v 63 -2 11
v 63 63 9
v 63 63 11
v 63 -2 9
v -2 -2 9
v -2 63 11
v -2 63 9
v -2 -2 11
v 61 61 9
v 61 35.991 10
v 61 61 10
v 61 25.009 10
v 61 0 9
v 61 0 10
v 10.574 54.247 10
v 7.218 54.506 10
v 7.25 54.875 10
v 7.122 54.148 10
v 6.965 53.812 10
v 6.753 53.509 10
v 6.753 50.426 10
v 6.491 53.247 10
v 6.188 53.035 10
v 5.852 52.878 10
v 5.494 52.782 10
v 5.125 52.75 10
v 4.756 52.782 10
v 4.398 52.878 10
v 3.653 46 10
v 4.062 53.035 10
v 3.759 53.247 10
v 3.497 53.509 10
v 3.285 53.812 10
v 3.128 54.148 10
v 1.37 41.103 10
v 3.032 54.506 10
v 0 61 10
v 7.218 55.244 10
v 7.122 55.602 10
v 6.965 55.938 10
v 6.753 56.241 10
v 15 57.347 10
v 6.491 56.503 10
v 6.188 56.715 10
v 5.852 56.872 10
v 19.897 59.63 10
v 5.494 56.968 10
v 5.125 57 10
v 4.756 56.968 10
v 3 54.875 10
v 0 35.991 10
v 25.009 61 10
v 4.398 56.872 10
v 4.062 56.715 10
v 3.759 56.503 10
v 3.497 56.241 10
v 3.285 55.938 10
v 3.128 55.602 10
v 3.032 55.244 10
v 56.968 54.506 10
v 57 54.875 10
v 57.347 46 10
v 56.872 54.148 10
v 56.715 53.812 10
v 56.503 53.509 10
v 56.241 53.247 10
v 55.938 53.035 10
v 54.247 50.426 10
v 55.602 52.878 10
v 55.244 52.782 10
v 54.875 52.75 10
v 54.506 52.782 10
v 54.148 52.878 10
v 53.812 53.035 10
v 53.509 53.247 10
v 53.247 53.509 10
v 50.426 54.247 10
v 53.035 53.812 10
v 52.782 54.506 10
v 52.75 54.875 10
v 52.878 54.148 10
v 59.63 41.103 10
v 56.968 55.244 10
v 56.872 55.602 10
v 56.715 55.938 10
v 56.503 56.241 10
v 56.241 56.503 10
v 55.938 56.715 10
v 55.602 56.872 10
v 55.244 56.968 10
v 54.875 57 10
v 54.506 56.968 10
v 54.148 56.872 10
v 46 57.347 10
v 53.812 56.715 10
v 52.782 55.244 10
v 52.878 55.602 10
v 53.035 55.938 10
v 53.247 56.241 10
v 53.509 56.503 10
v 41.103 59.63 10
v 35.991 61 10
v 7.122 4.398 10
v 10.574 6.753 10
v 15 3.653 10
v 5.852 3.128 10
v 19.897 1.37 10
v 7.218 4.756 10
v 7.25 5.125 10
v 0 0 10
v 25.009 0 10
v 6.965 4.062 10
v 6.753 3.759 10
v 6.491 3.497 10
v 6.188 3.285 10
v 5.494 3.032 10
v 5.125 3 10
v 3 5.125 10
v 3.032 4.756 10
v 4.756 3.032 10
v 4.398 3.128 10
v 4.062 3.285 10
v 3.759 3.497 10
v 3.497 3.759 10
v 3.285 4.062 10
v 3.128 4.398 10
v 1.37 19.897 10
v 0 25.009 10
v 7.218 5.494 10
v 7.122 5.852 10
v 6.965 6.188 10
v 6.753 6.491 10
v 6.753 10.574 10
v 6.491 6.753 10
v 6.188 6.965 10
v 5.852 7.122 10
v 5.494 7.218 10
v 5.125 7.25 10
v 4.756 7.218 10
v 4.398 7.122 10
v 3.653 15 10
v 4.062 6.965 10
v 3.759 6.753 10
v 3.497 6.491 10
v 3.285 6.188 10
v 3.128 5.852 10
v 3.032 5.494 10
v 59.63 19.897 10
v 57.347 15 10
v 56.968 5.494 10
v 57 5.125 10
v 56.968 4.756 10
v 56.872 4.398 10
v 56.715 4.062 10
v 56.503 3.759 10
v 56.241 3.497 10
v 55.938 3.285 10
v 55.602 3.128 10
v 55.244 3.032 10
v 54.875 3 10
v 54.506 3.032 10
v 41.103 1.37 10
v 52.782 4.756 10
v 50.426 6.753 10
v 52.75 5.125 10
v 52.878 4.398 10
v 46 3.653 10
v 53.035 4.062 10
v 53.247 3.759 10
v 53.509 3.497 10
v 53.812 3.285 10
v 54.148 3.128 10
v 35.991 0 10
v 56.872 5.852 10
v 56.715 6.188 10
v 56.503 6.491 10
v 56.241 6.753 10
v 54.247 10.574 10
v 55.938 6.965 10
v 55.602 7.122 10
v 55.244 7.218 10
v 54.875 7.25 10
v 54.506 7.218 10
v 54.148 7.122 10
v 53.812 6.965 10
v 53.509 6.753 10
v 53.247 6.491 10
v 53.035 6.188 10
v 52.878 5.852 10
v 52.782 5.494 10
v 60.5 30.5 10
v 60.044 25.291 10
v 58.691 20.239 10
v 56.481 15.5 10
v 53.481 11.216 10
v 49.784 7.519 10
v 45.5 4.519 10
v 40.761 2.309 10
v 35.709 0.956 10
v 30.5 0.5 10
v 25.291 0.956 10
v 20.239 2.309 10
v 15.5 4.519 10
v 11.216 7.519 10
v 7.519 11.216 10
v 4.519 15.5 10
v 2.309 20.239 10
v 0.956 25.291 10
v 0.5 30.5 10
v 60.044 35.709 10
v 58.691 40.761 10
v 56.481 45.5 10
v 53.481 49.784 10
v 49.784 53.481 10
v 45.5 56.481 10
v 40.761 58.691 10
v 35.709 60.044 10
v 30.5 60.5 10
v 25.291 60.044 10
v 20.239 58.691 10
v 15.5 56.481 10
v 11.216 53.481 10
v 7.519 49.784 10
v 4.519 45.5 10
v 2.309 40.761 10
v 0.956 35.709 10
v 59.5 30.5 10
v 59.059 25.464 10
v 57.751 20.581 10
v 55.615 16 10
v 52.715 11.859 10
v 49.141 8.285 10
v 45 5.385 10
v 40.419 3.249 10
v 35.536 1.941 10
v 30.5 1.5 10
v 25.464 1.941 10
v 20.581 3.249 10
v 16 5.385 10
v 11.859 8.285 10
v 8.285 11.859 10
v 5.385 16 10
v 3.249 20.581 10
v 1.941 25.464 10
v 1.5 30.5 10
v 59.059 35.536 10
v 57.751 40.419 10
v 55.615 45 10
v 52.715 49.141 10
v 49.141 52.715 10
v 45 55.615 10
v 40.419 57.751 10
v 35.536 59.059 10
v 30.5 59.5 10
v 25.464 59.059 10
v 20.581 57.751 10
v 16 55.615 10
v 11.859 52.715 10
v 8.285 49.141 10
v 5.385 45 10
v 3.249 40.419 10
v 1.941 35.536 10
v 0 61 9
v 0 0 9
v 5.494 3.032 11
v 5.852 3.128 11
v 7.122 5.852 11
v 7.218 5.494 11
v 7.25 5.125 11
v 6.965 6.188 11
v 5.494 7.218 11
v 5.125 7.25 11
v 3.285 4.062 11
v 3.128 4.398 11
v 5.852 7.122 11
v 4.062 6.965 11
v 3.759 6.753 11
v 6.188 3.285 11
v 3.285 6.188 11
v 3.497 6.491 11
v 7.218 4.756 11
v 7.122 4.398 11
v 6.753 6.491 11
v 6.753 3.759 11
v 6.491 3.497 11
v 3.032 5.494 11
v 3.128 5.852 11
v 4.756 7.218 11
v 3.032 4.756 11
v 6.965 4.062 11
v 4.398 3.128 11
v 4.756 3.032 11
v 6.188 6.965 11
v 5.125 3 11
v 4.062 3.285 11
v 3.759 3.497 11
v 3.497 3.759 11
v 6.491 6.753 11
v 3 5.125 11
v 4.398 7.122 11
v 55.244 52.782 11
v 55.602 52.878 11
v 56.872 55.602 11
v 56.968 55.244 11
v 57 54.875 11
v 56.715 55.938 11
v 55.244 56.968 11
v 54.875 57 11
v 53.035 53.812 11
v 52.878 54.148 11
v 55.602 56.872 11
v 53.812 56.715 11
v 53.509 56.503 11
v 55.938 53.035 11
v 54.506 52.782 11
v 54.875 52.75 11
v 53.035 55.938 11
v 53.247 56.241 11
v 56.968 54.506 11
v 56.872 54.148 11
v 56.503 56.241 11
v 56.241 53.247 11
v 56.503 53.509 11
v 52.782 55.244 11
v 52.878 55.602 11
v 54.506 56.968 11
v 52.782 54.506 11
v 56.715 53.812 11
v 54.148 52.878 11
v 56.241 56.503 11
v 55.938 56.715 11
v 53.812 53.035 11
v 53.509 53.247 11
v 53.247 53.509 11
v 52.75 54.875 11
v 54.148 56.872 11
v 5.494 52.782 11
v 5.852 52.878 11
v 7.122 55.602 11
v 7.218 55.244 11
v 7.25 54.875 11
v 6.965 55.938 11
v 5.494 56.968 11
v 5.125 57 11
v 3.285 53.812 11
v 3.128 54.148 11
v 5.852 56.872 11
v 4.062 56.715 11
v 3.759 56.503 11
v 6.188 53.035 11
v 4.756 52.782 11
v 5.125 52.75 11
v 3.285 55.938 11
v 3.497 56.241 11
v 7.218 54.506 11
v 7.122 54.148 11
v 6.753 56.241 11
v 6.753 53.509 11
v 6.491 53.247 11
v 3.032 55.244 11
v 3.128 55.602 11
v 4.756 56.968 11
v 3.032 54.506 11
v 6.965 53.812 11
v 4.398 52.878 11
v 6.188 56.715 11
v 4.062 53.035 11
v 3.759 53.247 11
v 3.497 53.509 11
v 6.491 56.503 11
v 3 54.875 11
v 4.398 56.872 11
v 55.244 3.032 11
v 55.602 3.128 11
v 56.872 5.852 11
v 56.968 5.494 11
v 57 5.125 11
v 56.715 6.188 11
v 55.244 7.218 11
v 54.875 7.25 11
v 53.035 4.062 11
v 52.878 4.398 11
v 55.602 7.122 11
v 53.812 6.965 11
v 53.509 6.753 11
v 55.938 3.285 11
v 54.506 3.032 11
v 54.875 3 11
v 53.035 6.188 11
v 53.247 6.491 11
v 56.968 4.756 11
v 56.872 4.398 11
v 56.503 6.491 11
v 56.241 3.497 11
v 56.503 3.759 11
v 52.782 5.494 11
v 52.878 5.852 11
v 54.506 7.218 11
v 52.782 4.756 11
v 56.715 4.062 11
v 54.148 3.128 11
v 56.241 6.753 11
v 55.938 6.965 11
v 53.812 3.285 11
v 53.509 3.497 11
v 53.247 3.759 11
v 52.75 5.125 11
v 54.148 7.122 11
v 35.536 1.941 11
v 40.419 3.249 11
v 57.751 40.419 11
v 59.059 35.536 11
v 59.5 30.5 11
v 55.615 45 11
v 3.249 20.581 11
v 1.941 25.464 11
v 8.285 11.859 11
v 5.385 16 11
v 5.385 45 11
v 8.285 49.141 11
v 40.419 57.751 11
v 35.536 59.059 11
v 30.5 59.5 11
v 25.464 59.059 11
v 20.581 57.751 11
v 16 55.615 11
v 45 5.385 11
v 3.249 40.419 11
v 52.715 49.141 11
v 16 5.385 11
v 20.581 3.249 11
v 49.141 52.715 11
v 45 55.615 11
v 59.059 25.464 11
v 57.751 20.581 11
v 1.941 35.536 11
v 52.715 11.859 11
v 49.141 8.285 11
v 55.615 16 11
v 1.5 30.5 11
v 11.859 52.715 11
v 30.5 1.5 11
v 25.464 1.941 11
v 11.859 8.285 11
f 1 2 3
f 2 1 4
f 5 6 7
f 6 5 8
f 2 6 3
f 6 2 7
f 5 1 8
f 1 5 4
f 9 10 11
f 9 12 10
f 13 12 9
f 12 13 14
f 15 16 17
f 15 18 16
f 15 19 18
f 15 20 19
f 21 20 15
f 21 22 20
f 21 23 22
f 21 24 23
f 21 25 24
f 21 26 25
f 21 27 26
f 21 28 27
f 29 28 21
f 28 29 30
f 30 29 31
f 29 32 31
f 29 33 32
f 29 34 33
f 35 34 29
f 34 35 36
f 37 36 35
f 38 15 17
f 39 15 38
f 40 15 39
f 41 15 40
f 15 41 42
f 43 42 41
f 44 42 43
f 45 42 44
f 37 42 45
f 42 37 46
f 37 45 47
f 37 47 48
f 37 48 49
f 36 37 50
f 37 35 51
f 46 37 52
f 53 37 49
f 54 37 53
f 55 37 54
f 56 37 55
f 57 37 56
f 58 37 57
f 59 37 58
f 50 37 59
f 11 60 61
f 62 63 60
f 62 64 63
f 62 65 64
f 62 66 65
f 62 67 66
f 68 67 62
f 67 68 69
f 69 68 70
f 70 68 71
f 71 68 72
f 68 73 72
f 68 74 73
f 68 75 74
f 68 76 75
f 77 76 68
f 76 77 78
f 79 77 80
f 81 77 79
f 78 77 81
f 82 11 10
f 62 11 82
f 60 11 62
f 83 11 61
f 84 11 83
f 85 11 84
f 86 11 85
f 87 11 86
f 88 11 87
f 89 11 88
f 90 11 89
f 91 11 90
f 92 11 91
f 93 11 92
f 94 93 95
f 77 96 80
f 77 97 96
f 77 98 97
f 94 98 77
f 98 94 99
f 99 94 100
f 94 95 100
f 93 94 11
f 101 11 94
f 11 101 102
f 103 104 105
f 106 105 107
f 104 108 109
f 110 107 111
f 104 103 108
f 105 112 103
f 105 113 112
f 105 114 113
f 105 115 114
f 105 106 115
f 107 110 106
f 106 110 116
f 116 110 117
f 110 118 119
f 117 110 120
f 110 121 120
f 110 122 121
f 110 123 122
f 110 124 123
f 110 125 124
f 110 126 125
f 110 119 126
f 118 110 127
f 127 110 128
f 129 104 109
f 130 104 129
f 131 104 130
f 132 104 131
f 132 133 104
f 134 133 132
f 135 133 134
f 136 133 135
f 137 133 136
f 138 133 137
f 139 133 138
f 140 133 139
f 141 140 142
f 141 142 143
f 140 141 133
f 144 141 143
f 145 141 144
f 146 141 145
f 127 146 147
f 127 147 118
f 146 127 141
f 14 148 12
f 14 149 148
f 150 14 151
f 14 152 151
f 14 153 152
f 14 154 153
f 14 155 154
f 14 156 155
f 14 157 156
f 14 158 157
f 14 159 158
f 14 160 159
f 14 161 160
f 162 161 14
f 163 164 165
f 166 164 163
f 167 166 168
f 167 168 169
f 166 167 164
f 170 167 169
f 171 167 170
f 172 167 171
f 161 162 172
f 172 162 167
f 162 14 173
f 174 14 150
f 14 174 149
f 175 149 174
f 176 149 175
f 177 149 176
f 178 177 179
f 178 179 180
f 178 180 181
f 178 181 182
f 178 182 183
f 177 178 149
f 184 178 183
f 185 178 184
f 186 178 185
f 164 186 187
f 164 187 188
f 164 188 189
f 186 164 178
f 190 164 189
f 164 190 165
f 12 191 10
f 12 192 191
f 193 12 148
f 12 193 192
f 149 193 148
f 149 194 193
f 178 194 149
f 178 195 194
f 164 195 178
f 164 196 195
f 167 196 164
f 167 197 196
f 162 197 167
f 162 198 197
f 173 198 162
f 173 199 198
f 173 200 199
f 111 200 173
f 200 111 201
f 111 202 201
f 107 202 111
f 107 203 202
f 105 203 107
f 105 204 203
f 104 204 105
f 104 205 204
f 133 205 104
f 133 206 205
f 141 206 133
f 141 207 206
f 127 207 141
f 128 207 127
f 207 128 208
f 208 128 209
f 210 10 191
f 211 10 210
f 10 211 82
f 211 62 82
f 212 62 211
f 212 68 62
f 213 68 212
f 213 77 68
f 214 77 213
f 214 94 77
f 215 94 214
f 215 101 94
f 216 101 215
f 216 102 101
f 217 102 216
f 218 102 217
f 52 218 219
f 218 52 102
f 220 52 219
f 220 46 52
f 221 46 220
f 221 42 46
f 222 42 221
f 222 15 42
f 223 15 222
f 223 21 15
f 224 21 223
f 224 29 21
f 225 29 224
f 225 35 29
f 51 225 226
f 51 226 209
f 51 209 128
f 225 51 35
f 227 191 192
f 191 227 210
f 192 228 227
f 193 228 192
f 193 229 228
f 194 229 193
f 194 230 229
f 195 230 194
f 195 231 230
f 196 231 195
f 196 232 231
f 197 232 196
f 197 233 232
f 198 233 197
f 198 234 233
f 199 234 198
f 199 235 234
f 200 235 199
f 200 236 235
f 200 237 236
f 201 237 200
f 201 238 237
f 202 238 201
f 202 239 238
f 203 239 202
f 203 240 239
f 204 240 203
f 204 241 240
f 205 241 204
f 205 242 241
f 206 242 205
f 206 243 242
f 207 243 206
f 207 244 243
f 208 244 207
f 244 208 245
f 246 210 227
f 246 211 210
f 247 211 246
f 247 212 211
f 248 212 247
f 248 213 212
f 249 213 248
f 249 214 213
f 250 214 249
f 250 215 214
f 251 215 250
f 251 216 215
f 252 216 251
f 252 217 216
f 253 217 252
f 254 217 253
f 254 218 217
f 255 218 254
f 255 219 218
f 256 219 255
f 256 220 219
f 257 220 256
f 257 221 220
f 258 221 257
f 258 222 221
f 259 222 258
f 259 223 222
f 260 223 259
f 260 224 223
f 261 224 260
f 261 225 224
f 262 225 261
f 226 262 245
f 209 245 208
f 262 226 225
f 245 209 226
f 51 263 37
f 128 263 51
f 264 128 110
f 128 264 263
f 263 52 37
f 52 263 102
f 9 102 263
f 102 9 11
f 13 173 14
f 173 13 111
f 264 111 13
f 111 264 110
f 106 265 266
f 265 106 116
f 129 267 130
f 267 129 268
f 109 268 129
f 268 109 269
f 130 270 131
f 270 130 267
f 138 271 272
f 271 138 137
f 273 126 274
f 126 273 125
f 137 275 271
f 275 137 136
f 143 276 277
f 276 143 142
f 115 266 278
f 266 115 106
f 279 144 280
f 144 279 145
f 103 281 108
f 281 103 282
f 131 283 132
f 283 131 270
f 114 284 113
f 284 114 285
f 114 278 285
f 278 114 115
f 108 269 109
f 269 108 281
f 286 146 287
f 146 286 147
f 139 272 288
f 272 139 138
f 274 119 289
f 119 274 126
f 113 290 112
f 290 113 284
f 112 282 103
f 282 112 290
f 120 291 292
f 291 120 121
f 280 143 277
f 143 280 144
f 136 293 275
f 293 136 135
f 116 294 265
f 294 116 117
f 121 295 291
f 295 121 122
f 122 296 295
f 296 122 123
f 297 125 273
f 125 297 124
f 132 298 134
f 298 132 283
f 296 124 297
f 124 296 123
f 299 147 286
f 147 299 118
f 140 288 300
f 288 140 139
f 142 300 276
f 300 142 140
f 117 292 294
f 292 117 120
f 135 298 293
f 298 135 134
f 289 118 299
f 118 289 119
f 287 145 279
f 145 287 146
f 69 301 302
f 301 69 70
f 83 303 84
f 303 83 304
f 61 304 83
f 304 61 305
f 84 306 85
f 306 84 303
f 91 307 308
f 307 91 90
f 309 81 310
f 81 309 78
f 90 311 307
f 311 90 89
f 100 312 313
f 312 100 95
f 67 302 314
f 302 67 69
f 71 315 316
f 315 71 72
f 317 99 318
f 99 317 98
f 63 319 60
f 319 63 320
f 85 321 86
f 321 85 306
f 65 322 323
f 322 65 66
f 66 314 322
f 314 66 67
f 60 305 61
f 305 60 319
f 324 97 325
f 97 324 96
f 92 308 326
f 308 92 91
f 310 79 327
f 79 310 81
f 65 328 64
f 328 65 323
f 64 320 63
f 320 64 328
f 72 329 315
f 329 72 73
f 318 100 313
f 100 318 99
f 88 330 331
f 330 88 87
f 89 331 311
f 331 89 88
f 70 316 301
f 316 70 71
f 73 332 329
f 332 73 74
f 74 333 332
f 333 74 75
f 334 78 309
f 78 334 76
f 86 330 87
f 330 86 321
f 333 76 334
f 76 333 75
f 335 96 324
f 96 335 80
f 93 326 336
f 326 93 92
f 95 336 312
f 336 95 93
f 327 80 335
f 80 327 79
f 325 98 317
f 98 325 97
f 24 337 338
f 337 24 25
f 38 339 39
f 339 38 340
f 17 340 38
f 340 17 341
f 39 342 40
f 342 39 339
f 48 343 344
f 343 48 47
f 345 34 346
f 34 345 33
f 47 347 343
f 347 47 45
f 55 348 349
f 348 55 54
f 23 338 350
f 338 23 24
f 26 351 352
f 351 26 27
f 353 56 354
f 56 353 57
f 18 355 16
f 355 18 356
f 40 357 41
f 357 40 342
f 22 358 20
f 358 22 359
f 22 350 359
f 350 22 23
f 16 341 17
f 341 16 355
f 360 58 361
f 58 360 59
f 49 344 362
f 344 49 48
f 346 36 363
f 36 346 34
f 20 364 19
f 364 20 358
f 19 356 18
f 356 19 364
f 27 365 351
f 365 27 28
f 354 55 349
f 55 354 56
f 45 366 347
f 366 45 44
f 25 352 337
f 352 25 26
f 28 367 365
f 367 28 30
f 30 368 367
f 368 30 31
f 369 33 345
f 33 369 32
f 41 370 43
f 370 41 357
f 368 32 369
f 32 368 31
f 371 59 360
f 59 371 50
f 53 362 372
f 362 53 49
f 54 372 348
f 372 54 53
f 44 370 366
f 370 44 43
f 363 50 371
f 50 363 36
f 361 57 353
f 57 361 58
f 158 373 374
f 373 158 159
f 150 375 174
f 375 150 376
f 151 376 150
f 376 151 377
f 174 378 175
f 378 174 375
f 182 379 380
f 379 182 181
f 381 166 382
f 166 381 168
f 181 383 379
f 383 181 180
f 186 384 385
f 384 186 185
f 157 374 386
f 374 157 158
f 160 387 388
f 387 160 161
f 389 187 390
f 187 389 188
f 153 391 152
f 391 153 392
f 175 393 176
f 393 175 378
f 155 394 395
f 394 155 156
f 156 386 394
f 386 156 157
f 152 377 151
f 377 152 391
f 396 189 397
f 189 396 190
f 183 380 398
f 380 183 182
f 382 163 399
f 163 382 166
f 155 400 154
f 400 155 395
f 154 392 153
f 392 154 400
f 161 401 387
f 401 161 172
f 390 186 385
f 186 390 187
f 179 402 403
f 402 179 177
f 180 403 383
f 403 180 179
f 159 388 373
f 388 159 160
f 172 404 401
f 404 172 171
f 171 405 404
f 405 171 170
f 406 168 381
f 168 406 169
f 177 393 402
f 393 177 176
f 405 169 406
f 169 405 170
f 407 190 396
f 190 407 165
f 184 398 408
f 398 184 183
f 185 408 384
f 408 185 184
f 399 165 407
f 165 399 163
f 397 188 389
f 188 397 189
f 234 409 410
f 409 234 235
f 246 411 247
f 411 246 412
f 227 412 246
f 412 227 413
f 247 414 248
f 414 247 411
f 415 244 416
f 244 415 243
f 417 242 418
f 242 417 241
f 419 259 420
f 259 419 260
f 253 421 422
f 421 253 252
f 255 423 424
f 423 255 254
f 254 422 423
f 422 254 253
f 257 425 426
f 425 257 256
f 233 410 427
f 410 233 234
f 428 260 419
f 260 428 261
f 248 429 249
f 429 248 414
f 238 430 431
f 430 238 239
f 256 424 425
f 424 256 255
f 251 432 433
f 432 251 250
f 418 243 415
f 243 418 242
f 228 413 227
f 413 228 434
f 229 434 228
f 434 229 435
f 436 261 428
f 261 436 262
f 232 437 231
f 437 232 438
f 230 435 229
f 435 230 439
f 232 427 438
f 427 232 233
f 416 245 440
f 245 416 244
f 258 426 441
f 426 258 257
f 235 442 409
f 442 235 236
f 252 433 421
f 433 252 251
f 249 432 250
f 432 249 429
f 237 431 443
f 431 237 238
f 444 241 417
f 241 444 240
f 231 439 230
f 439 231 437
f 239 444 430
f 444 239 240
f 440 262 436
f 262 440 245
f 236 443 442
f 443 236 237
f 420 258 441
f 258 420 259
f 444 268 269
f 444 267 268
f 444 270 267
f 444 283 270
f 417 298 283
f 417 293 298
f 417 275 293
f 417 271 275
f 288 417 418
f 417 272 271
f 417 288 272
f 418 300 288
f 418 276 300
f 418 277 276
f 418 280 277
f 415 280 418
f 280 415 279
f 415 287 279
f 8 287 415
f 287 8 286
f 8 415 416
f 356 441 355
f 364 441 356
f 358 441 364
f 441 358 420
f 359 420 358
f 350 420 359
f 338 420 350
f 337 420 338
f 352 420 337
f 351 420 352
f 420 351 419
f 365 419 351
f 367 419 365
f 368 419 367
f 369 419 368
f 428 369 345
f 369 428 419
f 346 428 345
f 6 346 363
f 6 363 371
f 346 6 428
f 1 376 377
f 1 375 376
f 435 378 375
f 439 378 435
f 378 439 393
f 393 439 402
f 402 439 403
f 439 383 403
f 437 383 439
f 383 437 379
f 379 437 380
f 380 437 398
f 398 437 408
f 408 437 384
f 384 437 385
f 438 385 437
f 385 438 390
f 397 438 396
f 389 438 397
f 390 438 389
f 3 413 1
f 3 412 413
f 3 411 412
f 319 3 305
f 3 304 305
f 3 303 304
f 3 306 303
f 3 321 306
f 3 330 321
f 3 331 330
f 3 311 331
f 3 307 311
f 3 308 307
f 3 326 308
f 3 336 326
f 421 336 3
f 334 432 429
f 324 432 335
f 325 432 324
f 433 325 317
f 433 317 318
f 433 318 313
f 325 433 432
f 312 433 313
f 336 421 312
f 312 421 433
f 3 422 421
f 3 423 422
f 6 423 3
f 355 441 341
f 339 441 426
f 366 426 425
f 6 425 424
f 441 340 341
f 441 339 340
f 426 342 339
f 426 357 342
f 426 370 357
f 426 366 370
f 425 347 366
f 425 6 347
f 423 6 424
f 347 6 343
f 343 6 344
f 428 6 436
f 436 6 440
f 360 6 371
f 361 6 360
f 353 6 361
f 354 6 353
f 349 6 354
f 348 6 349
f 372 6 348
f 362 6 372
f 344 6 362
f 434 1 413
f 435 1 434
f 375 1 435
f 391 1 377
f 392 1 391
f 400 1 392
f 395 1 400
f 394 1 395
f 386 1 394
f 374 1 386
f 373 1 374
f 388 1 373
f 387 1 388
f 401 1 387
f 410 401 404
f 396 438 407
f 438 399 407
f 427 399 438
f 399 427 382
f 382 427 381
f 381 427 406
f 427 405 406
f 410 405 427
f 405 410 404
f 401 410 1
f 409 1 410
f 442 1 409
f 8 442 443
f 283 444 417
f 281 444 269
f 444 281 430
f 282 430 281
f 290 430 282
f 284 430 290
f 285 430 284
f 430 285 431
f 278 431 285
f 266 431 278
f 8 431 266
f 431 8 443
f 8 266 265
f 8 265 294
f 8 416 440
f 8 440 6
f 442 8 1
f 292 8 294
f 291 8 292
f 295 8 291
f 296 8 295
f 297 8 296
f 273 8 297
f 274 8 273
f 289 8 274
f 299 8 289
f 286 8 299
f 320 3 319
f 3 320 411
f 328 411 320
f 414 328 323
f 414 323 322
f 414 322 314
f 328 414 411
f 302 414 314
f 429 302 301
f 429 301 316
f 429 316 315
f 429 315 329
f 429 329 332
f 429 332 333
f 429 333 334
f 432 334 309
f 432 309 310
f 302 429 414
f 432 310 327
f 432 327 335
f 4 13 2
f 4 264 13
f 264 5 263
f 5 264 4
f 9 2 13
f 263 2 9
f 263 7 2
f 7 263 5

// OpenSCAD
intersection() {
  union() {
    difference() {
      translate([-2,-2,0]) {
        cube([65, 65, 12]);
      }
      translate([0,0,0]) {
        cube([61, 61, 10]);
      }
      translate([5.125,5.125,0]) {
        cylinder(h=40, d=4.25, $fn=36);
      }
      translate([54.875,54.875,0]) {
        cylinder(h=40, d=4.25, $fn=36);
      }
      translate([5.125,54.875,0]) {
        cylinder(h=40, d=4.25, $fn=36);
      }
      translate([54.875,5.125,0]) {
        cylinder(h=40, d=4.25, $fn=36);
      }
      translate([30.5,30.5,0]) {
        cylinder(h=40, d=58, $fn=36);
      }
    }
    difference() {
      translate([30.5,30.5,10]) {
        cylinder(h=40, d1=62, d2=22, $fn=36);
      }
      translate([30.5,30.5,10]) {
        cylinder(h=40, d1=60, d2=20, $fn=36);
      }
    }
    difference() {
      translate([30.5,30.5,50]) {
        cylinder(h=10, d=22, $fn=36);
      }
      translate([30.5,30.5,50]) {
        cylinder(h=10, d=20, $fn=36);
      }
    }
  }
  translate([-3,-3,9]) {
    cube([66, 66, 2]);
  }
}
